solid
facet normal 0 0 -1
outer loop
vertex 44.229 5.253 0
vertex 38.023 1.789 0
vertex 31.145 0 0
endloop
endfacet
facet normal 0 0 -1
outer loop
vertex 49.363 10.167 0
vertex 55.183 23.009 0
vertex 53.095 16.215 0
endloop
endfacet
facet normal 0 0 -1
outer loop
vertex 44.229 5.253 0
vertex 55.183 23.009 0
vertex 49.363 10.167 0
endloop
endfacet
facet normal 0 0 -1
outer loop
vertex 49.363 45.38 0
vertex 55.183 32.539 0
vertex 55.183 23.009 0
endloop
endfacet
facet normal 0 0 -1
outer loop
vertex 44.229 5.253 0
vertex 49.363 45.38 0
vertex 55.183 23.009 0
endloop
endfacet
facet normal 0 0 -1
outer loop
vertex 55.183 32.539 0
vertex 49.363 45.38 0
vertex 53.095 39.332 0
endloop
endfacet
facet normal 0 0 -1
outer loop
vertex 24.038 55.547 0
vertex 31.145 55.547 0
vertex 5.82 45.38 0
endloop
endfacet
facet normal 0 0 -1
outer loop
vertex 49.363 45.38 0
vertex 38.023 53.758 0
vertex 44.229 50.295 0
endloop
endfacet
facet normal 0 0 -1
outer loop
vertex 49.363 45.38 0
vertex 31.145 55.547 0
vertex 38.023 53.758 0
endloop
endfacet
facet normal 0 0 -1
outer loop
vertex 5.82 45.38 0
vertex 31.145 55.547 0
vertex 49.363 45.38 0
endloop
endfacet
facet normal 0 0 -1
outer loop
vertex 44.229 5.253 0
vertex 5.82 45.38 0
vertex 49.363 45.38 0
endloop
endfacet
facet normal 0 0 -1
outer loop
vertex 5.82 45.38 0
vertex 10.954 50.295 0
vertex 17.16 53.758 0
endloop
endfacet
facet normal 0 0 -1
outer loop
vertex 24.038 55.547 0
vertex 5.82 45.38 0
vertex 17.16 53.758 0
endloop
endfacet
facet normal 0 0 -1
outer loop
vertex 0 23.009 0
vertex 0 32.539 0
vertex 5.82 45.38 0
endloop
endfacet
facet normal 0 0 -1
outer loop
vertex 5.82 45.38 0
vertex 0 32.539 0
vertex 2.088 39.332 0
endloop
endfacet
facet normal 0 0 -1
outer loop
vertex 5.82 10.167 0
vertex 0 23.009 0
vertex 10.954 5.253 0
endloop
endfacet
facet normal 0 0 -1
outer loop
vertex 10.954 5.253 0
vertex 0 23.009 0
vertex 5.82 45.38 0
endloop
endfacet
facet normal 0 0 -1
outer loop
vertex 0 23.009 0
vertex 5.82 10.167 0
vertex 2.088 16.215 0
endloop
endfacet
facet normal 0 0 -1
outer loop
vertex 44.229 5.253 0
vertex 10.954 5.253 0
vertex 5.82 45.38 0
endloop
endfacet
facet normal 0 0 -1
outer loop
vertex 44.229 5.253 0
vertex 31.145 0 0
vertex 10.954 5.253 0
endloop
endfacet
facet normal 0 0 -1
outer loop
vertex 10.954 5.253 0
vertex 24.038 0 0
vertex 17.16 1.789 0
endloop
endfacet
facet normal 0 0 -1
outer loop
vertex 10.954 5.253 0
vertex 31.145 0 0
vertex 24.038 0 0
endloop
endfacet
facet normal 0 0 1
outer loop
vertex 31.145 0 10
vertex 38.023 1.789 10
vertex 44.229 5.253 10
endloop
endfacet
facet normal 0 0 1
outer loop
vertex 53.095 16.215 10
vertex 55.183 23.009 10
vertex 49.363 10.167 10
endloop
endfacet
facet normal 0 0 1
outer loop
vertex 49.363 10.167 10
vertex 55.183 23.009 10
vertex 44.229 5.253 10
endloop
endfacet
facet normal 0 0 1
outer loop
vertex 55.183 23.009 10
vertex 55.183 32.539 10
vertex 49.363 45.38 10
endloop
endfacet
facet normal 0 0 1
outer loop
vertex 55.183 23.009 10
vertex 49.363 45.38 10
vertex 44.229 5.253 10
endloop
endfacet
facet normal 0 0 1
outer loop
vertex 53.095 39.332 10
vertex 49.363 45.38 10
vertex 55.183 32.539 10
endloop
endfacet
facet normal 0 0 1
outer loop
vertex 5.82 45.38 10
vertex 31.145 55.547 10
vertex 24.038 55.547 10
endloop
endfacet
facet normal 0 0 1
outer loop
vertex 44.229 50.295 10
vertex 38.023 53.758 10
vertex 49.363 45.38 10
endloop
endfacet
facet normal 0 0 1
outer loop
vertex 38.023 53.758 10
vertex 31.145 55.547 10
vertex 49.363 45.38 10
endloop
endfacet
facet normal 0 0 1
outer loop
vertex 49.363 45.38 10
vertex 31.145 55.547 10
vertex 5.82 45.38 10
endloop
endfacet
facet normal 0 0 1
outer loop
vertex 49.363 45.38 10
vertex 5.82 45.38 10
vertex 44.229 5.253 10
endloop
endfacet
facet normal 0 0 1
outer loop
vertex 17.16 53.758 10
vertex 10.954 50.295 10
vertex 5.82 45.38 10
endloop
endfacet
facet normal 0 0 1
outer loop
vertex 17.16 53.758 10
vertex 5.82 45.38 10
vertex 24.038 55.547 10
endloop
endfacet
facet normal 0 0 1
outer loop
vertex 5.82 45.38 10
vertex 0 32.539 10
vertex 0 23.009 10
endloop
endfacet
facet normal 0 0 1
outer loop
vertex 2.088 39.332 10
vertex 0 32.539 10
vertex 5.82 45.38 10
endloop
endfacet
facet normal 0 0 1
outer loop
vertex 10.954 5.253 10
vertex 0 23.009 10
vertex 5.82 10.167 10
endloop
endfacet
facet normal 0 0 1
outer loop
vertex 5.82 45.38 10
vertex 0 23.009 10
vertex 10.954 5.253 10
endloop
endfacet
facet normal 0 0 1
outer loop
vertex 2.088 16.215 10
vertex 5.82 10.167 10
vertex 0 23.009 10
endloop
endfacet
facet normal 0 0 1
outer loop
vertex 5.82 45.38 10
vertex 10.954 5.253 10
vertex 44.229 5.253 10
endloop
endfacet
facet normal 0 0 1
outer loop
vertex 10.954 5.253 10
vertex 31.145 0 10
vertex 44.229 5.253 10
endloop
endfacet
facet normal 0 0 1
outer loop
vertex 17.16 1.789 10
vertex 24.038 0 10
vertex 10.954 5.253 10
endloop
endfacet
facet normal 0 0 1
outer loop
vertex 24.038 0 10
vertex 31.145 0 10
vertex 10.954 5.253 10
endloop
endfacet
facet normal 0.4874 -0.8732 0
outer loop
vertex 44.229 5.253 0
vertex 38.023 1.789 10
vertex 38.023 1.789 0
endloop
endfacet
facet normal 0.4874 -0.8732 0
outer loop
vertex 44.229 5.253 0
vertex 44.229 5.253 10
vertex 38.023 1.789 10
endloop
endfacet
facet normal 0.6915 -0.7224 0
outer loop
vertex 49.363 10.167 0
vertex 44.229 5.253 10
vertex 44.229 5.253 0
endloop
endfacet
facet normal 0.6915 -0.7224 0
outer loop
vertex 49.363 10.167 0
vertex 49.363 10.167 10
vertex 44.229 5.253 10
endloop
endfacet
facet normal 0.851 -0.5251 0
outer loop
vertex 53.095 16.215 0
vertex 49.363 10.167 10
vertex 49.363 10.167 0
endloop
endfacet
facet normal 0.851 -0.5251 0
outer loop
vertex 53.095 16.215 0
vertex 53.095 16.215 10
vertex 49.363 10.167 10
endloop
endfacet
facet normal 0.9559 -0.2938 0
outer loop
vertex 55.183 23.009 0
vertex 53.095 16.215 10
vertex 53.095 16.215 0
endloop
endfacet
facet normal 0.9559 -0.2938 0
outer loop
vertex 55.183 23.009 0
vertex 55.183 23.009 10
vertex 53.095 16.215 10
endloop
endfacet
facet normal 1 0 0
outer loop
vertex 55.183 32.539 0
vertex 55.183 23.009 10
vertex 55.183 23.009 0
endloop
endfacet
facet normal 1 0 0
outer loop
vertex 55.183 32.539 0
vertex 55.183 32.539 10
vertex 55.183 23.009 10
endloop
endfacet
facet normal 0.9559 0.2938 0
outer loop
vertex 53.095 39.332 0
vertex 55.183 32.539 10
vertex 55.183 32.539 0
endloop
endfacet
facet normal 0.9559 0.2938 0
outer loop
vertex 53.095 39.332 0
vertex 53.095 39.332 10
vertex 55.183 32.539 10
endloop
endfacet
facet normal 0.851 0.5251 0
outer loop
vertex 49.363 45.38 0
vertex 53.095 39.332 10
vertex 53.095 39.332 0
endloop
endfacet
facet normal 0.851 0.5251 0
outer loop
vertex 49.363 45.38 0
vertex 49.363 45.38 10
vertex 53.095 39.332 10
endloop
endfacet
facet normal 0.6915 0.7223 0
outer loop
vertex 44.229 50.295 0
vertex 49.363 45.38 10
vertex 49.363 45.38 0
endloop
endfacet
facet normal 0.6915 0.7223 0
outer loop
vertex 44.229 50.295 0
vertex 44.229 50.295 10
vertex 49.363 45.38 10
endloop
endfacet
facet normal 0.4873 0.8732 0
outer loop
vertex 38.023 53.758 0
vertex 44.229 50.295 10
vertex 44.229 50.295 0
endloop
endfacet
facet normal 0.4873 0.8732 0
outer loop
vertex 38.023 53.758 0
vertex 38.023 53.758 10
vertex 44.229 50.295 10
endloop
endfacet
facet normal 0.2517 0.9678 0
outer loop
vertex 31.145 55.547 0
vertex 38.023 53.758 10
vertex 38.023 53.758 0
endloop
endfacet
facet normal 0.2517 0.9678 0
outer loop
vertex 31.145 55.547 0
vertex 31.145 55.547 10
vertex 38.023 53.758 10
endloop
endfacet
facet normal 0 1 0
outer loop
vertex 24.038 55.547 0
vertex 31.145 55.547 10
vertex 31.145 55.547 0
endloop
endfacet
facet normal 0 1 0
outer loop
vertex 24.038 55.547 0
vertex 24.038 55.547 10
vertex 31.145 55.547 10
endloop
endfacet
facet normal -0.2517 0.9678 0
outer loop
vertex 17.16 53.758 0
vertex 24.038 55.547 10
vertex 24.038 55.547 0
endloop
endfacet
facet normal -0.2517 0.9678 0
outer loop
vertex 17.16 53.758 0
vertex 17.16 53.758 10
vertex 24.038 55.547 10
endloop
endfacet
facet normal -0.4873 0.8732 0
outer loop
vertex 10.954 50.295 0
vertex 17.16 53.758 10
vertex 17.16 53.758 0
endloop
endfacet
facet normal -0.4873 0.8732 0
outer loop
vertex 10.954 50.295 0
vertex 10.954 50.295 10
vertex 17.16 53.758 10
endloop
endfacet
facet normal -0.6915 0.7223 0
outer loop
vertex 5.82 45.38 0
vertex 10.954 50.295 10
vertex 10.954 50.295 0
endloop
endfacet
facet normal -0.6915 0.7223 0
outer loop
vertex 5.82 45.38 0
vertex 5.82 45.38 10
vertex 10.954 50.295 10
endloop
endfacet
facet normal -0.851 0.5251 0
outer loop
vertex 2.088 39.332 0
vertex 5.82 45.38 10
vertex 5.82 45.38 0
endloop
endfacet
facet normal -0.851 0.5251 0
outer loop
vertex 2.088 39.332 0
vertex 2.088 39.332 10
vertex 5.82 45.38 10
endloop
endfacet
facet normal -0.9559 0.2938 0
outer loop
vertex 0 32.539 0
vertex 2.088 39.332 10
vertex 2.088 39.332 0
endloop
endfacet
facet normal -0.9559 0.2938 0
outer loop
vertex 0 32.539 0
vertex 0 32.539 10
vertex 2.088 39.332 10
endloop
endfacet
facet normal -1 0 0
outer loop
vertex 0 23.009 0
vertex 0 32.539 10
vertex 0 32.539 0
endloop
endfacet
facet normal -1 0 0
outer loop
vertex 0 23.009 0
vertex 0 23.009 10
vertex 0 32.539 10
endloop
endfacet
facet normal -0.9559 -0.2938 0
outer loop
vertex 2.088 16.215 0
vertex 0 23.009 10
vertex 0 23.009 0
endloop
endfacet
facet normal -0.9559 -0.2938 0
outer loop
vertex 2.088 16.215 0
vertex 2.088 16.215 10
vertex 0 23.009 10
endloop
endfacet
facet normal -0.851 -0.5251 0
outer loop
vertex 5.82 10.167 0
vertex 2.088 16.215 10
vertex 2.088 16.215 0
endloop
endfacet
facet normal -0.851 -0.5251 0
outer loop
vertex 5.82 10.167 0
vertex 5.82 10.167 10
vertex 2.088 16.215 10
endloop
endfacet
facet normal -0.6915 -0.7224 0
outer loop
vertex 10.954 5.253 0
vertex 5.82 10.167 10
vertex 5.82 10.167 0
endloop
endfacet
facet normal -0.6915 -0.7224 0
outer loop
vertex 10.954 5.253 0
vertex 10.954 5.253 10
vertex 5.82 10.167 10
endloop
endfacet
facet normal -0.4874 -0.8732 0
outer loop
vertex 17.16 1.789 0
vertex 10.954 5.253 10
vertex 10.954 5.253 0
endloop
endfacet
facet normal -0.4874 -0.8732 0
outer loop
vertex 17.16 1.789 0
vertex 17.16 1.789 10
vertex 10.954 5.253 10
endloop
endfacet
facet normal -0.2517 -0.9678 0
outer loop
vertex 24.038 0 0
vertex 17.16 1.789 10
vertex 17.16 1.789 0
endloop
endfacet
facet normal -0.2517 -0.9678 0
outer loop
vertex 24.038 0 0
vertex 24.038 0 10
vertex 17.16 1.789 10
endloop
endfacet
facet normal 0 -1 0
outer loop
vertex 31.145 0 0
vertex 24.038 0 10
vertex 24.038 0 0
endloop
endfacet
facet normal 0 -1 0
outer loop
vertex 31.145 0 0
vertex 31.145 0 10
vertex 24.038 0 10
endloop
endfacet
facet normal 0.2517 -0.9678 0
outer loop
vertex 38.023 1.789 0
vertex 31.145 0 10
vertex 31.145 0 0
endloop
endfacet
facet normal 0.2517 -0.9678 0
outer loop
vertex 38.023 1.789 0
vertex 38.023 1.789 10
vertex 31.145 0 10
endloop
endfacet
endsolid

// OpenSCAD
$fn = 32;

// ----------------------------------------------------------------------
// Flat adaptor: double_d, 10 mm thick
// ----------------------------------------------------------------------

// --- parameters (mm) ---
profile_height = 10;      // extrusion height
profile_points = 24;      // points of the closed outline

profile = [[55.183, 32.539], [53.095, 39.332], [49.363, 45.38], [44.229, 50.295], [38.023, 53.758], [31.145, 55.547], [24.038, 55.547], [17.16, 53.758], [10.954, 50.295], [5.82, 45.38], [2.088, 39.332], [0, 32.539], [0, 23.009], [2.088, 16.215], [5.82, 10.167], [10.954, 5.253], [17.16, 1.789], [24.038, 0], [31.145, 0], [38.023, 1.789], [44.229, 5.253], [49.363, 10.167], [53.095, 16.215], [55.183, 23.009]];  // single closed polygon, 24 points, counter clockwise

// --- the one profile operation ---
linear_extrude(height = profile_height) polygon(points = profile);
